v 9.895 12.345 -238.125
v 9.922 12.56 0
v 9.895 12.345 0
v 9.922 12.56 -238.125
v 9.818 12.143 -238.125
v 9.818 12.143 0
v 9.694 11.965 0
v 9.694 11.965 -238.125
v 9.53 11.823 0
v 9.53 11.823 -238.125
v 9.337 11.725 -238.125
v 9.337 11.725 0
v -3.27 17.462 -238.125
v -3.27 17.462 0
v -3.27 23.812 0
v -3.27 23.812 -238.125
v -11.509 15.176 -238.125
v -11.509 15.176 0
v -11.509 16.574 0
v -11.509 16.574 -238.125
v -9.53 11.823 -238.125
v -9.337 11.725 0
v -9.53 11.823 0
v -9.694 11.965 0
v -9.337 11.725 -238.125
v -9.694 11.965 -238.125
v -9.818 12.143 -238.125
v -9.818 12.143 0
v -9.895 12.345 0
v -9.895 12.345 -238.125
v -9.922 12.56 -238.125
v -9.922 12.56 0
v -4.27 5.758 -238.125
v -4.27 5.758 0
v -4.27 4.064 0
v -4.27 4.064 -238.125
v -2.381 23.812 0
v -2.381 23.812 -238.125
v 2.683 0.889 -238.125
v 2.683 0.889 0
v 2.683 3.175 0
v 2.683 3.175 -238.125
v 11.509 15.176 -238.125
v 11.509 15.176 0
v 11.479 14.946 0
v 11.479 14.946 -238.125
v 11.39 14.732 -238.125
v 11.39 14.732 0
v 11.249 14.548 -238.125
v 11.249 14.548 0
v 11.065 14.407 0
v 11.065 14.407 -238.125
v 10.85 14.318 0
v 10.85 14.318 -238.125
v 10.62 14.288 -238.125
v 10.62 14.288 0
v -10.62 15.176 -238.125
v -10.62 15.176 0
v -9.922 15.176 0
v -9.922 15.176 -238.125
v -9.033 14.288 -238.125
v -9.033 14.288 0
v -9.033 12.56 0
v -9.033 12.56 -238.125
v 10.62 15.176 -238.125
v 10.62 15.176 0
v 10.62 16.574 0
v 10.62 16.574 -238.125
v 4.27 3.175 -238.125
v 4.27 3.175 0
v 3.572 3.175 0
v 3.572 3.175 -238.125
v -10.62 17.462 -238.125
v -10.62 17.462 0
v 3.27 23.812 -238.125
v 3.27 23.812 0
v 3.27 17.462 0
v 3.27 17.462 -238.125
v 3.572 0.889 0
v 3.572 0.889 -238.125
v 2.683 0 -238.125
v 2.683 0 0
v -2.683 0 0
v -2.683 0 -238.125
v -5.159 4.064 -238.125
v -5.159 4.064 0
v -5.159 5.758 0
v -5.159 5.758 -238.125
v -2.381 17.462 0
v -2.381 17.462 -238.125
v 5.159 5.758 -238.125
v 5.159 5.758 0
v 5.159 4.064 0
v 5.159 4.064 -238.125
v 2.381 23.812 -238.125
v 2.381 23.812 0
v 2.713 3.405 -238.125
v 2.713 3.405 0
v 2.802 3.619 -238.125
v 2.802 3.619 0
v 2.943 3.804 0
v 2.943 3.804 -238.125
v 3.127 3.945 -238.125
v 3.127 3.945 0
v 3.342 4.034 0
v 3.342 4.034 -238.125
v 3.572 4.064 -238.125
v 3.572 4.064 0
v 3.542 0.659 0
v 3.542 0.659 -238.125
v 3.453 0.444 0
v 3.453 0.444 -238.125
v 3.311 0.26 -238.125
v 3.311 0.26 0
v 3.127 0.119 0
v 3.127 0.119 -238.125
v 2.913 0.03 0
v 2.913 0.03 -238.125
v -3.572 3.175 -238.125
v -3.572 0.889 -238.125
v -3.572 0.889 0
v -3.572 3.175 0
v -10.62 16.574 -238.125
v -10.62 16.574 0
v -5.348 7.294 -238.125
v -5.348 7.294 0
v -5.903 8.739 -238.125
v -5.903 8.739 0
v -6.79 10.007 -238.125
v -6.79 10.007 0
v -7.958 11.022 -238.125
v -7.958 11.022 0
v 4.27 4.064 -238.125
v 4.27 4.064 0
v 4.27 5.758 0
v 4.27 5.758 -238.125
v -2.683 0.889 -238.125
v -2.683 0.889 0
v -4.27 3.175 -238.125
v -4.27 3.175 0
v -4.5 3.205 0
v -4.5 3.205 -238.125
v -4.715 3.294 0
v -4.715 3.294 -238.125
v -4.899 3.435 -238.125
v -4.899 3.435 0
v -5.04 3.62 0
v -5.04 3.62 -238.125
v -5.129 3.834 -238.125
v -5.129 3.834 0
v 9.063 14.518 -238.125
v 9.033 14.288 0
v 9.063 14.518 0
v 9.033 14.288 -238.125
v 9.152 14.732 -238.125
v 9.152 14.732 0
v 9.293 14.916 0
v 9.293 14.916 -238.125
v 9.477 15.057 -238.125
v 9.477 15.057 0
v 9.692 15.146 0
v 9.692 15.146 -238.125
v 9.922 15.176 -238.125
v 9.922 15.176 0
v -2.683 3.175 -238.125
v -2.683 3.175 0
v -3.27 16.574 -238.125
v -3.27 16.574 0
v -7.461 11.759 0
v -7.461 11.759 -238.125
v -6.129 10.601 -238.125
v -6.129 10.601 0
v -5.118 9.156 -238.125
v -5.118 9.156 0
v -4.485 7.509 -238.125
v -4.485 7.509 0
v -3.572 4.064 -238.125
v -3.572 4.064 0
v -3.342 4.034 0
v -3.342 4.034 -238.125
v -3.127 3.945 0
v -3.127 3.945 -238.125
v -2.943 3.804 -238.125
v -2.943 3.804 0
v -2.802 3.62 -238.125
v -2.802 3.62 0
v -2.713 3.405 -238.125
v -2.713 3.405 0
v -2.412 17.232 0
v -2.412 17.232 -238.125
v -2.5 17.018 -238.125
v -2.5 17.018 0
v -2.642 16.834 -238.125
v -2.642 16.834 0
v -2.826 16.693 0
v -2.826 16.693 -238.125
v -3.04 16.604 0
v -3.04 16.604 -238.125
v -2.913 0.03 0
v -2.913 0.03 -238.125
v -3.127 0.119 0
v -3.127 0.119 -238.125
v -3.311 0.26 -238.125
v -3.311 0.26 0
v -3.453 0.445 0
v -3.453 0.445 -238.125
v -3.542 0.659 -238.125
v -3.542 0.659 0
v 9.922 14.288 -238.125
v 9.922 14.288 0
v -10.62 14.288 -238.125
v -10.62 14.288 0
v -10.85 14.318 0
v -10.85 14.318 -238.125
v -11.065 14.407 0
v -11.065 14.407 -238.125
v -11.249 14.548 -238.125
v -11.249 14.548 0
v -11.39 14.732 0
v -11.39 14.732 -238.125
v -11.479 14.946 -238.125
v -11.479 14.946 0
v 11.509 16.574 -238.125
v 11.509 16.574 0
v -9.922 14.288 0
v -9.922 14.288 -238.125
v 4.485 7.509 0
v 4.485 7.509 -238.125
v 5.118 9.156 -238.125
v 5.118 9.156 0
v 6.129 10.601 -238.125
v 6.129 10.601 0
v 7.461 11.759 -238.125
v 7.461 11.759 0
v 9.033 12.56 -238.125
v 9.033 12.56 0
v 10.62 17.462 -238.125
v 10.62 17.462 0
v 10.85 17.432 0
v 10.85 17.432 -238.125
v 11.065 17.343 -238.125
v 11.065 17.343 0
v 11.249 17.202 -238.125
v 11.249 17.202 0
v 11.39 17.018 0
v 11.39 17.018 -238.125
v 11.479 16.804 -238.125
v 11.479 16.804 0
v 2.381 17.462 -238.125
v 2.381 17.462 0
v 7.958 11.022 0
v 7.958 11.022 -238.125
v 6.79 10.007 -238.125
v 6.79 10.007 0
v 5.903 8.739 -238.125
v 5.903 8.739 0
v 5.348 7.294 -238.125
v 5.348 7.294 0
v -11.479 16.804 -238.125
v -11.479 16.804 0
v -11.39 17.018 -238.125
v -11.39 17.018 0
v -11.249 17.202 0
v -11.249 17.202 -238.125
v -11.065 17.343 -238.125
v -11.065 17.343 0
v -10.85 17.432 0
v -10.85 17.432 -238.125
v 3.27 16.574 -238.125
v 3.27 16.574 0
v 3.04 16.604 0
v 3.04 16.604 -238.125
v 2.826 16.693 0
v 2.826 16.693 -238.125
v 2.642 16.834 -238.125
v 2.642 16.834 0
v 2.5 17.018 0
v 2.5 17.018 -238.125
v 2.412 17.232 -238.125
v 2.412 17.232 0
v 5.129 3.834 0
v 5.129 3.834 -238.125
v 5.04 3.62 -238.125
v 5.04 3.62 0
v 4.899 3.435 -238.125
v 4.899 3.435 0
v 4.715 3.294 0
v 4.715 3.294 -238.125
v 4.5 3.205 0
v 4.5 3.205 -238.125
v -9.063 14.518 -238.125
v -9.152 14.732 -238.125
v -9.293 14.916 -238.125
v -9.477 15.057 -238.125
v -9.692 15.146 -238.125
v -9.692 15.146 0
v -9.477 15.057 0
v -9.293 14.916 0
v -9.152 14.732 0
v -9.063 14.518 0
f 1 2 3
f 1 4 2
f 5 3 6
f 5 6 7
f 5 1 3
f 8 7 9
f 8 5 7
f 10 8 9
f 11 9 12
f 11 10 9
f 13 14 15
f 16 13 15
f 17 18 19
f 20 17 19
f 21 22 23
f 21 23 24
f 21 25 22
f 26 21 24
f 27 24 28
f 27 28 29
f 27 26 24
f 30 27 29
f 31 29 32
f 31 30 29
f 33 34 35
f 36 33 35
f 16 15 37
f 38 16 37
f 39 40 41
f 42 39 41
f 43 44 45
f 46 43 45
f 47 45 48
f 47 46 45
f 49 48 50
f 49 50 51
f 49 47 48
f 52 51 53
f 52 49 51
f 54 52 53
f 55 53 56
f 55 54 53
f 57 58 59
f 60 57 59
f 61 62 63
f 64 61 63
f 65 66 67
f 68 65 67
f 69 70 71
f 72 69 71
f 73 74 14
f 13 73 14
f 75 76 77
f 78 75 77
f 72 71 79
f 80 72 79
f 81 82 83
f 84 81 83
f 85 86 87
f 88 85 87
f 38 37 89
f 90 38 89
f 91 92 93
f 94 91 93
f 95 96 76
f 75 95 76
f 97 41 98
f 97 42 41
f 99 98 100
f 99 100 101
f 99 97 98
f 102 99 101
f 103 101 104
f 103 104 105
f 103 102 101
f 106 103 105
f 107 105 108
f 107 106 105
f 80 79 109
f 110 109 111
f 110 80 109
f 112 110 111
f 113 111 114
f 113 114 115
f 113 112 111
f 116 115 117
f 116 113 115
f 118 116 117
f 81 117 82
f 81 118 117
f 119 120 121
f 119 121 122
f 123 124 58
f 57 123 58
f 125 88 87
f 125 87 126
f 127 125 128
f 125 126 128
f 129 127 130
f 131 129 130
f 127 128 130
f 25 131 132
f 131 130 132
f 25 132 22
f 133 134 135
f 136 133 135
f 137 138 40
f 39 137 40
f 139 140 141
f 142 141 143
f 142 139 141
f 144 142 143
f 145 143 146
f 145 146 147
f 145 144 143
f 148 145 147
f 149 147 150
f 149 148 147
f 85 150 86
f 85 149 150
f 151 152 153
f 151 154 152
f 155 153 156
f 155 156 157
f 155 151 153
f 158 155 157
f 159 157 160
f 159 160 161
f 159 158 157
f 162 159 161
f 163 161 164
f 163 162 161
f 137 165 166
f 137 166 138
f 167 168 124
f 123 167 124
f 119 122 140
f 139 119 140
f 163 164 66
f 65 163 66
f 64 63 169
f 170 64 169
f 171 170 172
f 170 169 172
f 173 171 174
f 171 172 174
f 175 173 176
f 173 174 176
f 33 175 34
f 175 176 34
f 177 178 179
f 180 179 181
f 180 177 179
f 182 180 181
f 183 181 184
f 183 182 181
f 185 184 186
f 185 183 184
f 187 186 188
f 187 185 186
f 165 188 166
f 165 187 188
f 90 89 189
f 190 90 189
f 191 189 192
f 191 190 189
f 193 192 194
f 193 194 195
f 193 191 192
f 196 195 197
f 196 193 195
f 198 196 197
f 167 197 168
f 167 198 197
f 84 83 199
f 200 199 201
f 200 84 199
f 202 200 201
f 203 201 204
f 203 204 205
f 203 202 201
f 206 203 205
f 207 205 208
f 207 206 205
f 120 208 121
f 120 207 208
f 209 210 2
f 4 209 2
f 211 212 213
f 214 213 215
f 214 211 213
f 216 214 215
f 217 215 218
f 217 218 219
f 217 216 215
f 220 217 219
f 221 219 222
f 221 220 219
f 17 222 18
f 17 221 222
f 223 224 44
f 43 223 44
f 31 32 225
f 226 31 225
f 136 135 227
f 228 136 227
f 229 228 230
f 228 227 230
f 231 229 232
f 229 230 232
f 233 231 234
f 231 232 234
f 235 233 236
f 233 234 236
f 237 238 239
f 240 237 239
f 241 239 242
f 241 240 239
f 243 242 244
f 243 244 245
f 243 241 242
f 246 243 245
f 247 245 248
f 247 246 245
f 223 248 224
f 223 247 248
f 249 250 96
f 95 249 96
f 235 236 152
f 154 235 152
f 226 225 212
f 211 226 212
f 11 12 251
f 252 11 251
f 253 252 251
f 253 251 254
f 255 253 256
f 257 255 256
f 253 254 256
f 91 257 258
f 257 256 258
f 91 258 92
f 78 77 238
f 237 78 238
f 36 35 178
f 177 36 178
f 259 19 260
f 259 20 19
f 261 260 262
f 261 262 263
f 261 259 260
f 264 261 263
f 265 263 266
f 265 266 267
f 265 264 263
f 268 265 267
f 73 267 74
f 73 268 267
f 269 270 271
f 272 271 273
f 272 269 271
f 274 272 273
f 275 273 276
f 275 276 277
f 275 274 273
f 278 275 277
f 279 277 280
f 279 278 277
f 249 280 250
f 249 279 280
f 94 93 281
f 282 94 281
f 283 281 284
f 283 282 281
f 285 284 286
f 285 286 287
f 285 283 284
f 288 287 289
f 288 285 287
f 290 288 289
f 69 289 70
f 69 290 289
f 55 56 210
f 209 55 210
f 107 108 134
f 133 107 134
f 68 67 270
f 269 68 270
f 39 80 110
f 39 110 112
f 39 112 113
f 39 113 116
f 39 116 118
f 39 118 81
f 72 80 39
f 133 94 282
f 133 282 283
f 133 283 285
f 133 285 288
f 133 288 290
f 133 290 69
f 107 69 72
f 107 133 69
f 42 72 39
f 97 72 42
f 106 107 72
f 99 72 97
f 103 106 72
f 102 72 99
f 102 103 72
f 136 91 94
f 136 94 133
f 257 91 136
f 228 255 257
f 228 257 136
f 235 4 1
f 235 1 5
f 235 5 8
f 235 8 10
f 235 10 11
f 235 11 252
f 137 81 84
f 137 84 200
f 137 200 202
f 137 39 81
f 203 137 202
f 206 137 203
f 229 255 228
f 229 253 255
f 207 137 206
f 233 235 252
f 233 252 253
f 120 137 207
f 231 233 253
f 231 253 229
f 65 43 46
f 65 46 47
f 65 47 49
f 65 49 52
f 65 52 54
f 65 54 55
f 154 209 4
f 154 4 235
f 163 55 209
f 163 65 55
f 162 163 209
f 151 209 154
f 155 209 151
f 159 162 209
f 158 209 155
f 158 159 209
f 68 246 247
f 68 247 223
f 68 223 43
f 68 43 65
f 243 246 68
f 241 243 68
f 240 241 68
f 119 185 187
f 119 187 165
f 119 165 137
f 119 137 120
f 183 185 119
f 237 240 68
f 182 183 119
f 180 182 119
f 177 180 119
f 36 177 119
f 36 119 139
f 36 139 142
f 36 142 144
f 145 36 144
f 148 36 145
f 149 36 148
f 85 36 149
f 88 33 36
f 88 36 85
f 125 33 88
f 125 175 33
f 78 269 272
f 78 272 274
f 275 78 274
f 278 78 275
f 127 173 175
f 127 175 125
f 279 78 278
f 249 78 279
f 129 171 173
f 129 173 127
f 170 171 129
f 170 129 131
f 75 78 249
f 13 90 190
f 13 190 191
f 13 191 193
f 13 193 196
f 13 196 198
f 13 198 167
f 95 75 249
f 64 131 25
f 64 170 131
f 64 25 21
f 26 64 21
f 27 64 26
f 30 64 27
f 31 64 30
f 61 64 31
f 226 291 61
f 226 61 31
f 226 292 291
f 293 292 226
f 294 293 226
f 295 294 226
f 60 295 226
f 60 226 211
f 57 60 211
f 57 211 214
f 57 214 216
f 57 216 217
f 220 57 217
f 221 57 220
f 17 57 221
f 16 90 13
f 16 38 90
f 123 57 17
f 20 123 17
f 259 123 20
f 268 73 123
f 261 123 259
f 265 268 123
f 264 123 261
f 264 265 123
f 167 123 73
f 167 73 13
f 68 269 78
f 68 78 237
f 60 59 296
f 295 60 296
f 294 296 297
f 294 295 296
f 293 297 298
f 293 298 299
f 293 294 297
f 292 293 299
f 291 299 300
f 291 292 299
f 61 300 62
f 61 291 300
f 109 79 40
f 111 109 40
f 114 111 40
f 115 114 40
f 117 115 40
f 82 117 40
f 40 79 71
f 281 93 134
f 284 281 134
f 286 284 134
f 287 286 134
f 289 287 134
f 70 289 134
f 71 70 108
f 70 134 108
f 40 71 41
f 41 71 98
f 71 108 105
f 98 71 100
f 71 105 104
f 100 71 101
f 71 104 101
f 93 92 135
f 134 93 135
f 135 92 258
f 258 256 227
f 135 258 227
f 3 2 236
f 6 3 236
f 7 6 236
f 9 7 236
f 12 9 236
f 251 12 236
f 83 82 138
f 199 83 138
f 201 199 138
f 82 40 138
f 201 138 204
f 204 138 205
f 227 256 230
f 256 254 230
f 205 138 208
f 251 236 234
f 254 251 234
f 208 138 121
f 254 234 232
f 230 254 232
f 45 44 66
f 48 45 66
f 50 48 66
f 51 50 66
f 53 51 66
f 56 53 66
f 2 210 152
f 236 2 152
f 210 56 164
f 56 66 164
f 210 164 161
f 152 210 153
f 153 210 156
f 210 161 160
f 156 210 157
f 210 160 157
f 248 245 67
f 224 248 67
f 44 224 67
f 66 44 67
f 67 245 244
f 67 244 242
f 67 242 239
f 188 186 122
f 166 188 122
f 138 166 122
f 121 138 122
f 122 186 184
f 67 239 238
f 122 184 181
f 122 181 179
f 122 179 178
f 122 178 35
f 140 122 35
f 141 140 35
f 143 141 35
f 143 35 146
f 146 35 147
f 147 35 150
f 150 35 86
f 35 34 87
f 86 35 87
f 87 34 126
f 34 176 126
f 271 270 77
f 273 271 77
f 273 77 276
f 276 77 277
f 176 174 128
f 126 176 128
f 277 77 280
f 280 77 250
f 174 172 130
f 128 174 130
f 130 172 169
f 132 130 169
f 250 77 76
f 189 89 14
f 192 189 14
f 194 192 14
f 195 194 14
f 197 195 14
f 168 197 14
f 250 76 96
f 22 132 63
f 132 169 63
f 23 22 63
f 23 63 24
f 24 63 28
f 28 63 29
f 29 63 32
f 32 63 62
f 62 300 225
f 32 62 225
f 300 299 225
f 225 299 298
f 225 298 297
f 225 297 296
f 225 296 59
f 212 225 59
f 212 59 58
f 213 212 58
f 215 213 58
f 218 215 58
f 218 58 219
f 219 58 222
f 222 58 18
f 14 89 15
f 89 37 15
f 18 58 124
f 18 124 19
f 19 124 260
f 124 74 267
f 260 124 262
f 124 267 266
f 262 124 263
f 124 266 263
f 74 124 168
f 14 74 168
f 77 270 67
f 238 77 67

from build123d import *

# Parameters (mm, degrees)
EXTRUDE_THIN1_DEPTH = 238.125
FILLET1_R           = 0.889


with BuildPart() as part:
    # Sketch1 → Extrude-Thin1 (new body)
    with BuildSketch(Plane.XY):
        with BuildLine():
            Line((3.27025, 23.8125), (3.27025, 17.4625))
            Line((3.27025, 17.4625), (11.509375, 17.4625))
            Line((11.509375, 17.4625), (11.509375, 14.2875))
            Line((11.509375, 14.2875), (9.921875, 14.2875))
            Line((9.921875, 14.2875), (9.921875, 11.90625))
            ThreePointArc((9.921875, 11.90625), (6.489259214, 9.646453905), (5.159375, 5.757888938))
            Line((5.159375, 5.757888938), (5.159375, 3.175))
            Line((5.159375, 3.175), (3.571875, 3.175))
            Line((3.571875, 3.175), (3.571875, 0))
            Line((3.571875, 0), (-3.571875, 0))
            Line((-3.571875, 0), (-3.571875, 3.175))
            Line((-3.571875, 3.175), (-5.159375, 3.175))
            Line((-5.159375, 3.175), (-5.159375, 5.757888938))
            ThreePointArc((-5.159375, 5.757888938), (-6.489259214, 9.646453905), (-9.921875, 11.90625))
            Line((-9.921875, 11.90625), (-9.921875, 14.2875))
            Line((-9.921875, 14.2875), (-11.509375, 14.2875))
            Line((-11.509375, 14.2875), (-11.509375, 17.4625))
            Line((-11.509375, 17.4625), (-3.27025, 17.4625))
            Line((-3.27025, 17.4625), (-3.27025, 23.8125))
            Line((-3.27025, 23.8125), (-2.38125, 23.8125))
            Line((-2.38125, 23.8125), (-2.38125, 16.5735))
            Line((-2.38125, 16.5735), (-10.620375, 16.5735))
            Line((-10.620375, 16.5735), (-10.620375, 15.1765))
            Line((-10.620375, 15.1765), (-9.032875, 15.1765))
            Line((-9.032875, 15.1765), (-9.032875, 12.560099516))
            ThreePointArc((-9.032875, 12.560099516), (-5.579345299, 9.909740182), (-4.270375, 5.757888938))
            Line((-4.270375, 5.757888938), (-4.270375, 4.064))
            Line((-4.270375, 4.064), (-2.682875, 4.064))
            Line((-2.682875, 4.064), (-2.682875, 0.889))
            Line((-2.682875, 0.889), (2.682875, 0.889))
            Line((2.682875, 0.889), (2.682875, 4.064))
            Line((2.682875, 4.064), (4.270375, 4.064))
            Line((4.270375, 4.064), (4.270375, 5.757888938))
            ThreePointArc((4.270375, 5.757888938), (5.579345299, 9.909740182), (9.032875, 12.560099516))
            Line((9.032875, 12.560099516), (9.032875, 15.1765))
            Line((9.032875, 15.1765), (10.620375, 15.1765))
            Line((10.620375, 15.1765), (10.620375, 16.5735))
            Line((10.620375, 16.5735), (2.38125, 16.5735))
            Line((2.38125, 16.5735), (2.38125, 23.8125))
            Line((2.38125, 23.8125), (3.27025, 23.8125))
        make_face()
    extrude(amount=-EXTRUDE_THIN1_DEPTH)

    # Fillet1
    fillet1_edges = [part.edges().sort_by_distance(p)[0] for p in [
        (11.509375, 17.4625, -119.0625),
        (11.509375, 14.2875, -119.0625),
        (9.921875, 11.90625, -119.0625),
        (5.159375, 3.175, -119.0625),
        (3.571875, 0, -119.0625),
        (-3.571875, 0, -119.0625),
        (-5.159375, 3.175, -119.0625),
        (-9.921875, 11.90625, -119.0625),
        (-11.509375, 14.2875, -119.0625),
        (-11.509375, 17.4625, -119.0625),
        (-2.38125, 16.5735, -119.0625),
        (-9.032875, 15.1765, -119.0625),
        (-2.682875, 4.064, -119.0625),
        (2.682875, 4.064, -119.0625),
        (9.032875, 15.1765, -119.0625),
        (2.38125, 16.5735, -119.0625),
    ]]
    fillet(fillet1_edges, radius=FILLET1_R)


solid = part.part
